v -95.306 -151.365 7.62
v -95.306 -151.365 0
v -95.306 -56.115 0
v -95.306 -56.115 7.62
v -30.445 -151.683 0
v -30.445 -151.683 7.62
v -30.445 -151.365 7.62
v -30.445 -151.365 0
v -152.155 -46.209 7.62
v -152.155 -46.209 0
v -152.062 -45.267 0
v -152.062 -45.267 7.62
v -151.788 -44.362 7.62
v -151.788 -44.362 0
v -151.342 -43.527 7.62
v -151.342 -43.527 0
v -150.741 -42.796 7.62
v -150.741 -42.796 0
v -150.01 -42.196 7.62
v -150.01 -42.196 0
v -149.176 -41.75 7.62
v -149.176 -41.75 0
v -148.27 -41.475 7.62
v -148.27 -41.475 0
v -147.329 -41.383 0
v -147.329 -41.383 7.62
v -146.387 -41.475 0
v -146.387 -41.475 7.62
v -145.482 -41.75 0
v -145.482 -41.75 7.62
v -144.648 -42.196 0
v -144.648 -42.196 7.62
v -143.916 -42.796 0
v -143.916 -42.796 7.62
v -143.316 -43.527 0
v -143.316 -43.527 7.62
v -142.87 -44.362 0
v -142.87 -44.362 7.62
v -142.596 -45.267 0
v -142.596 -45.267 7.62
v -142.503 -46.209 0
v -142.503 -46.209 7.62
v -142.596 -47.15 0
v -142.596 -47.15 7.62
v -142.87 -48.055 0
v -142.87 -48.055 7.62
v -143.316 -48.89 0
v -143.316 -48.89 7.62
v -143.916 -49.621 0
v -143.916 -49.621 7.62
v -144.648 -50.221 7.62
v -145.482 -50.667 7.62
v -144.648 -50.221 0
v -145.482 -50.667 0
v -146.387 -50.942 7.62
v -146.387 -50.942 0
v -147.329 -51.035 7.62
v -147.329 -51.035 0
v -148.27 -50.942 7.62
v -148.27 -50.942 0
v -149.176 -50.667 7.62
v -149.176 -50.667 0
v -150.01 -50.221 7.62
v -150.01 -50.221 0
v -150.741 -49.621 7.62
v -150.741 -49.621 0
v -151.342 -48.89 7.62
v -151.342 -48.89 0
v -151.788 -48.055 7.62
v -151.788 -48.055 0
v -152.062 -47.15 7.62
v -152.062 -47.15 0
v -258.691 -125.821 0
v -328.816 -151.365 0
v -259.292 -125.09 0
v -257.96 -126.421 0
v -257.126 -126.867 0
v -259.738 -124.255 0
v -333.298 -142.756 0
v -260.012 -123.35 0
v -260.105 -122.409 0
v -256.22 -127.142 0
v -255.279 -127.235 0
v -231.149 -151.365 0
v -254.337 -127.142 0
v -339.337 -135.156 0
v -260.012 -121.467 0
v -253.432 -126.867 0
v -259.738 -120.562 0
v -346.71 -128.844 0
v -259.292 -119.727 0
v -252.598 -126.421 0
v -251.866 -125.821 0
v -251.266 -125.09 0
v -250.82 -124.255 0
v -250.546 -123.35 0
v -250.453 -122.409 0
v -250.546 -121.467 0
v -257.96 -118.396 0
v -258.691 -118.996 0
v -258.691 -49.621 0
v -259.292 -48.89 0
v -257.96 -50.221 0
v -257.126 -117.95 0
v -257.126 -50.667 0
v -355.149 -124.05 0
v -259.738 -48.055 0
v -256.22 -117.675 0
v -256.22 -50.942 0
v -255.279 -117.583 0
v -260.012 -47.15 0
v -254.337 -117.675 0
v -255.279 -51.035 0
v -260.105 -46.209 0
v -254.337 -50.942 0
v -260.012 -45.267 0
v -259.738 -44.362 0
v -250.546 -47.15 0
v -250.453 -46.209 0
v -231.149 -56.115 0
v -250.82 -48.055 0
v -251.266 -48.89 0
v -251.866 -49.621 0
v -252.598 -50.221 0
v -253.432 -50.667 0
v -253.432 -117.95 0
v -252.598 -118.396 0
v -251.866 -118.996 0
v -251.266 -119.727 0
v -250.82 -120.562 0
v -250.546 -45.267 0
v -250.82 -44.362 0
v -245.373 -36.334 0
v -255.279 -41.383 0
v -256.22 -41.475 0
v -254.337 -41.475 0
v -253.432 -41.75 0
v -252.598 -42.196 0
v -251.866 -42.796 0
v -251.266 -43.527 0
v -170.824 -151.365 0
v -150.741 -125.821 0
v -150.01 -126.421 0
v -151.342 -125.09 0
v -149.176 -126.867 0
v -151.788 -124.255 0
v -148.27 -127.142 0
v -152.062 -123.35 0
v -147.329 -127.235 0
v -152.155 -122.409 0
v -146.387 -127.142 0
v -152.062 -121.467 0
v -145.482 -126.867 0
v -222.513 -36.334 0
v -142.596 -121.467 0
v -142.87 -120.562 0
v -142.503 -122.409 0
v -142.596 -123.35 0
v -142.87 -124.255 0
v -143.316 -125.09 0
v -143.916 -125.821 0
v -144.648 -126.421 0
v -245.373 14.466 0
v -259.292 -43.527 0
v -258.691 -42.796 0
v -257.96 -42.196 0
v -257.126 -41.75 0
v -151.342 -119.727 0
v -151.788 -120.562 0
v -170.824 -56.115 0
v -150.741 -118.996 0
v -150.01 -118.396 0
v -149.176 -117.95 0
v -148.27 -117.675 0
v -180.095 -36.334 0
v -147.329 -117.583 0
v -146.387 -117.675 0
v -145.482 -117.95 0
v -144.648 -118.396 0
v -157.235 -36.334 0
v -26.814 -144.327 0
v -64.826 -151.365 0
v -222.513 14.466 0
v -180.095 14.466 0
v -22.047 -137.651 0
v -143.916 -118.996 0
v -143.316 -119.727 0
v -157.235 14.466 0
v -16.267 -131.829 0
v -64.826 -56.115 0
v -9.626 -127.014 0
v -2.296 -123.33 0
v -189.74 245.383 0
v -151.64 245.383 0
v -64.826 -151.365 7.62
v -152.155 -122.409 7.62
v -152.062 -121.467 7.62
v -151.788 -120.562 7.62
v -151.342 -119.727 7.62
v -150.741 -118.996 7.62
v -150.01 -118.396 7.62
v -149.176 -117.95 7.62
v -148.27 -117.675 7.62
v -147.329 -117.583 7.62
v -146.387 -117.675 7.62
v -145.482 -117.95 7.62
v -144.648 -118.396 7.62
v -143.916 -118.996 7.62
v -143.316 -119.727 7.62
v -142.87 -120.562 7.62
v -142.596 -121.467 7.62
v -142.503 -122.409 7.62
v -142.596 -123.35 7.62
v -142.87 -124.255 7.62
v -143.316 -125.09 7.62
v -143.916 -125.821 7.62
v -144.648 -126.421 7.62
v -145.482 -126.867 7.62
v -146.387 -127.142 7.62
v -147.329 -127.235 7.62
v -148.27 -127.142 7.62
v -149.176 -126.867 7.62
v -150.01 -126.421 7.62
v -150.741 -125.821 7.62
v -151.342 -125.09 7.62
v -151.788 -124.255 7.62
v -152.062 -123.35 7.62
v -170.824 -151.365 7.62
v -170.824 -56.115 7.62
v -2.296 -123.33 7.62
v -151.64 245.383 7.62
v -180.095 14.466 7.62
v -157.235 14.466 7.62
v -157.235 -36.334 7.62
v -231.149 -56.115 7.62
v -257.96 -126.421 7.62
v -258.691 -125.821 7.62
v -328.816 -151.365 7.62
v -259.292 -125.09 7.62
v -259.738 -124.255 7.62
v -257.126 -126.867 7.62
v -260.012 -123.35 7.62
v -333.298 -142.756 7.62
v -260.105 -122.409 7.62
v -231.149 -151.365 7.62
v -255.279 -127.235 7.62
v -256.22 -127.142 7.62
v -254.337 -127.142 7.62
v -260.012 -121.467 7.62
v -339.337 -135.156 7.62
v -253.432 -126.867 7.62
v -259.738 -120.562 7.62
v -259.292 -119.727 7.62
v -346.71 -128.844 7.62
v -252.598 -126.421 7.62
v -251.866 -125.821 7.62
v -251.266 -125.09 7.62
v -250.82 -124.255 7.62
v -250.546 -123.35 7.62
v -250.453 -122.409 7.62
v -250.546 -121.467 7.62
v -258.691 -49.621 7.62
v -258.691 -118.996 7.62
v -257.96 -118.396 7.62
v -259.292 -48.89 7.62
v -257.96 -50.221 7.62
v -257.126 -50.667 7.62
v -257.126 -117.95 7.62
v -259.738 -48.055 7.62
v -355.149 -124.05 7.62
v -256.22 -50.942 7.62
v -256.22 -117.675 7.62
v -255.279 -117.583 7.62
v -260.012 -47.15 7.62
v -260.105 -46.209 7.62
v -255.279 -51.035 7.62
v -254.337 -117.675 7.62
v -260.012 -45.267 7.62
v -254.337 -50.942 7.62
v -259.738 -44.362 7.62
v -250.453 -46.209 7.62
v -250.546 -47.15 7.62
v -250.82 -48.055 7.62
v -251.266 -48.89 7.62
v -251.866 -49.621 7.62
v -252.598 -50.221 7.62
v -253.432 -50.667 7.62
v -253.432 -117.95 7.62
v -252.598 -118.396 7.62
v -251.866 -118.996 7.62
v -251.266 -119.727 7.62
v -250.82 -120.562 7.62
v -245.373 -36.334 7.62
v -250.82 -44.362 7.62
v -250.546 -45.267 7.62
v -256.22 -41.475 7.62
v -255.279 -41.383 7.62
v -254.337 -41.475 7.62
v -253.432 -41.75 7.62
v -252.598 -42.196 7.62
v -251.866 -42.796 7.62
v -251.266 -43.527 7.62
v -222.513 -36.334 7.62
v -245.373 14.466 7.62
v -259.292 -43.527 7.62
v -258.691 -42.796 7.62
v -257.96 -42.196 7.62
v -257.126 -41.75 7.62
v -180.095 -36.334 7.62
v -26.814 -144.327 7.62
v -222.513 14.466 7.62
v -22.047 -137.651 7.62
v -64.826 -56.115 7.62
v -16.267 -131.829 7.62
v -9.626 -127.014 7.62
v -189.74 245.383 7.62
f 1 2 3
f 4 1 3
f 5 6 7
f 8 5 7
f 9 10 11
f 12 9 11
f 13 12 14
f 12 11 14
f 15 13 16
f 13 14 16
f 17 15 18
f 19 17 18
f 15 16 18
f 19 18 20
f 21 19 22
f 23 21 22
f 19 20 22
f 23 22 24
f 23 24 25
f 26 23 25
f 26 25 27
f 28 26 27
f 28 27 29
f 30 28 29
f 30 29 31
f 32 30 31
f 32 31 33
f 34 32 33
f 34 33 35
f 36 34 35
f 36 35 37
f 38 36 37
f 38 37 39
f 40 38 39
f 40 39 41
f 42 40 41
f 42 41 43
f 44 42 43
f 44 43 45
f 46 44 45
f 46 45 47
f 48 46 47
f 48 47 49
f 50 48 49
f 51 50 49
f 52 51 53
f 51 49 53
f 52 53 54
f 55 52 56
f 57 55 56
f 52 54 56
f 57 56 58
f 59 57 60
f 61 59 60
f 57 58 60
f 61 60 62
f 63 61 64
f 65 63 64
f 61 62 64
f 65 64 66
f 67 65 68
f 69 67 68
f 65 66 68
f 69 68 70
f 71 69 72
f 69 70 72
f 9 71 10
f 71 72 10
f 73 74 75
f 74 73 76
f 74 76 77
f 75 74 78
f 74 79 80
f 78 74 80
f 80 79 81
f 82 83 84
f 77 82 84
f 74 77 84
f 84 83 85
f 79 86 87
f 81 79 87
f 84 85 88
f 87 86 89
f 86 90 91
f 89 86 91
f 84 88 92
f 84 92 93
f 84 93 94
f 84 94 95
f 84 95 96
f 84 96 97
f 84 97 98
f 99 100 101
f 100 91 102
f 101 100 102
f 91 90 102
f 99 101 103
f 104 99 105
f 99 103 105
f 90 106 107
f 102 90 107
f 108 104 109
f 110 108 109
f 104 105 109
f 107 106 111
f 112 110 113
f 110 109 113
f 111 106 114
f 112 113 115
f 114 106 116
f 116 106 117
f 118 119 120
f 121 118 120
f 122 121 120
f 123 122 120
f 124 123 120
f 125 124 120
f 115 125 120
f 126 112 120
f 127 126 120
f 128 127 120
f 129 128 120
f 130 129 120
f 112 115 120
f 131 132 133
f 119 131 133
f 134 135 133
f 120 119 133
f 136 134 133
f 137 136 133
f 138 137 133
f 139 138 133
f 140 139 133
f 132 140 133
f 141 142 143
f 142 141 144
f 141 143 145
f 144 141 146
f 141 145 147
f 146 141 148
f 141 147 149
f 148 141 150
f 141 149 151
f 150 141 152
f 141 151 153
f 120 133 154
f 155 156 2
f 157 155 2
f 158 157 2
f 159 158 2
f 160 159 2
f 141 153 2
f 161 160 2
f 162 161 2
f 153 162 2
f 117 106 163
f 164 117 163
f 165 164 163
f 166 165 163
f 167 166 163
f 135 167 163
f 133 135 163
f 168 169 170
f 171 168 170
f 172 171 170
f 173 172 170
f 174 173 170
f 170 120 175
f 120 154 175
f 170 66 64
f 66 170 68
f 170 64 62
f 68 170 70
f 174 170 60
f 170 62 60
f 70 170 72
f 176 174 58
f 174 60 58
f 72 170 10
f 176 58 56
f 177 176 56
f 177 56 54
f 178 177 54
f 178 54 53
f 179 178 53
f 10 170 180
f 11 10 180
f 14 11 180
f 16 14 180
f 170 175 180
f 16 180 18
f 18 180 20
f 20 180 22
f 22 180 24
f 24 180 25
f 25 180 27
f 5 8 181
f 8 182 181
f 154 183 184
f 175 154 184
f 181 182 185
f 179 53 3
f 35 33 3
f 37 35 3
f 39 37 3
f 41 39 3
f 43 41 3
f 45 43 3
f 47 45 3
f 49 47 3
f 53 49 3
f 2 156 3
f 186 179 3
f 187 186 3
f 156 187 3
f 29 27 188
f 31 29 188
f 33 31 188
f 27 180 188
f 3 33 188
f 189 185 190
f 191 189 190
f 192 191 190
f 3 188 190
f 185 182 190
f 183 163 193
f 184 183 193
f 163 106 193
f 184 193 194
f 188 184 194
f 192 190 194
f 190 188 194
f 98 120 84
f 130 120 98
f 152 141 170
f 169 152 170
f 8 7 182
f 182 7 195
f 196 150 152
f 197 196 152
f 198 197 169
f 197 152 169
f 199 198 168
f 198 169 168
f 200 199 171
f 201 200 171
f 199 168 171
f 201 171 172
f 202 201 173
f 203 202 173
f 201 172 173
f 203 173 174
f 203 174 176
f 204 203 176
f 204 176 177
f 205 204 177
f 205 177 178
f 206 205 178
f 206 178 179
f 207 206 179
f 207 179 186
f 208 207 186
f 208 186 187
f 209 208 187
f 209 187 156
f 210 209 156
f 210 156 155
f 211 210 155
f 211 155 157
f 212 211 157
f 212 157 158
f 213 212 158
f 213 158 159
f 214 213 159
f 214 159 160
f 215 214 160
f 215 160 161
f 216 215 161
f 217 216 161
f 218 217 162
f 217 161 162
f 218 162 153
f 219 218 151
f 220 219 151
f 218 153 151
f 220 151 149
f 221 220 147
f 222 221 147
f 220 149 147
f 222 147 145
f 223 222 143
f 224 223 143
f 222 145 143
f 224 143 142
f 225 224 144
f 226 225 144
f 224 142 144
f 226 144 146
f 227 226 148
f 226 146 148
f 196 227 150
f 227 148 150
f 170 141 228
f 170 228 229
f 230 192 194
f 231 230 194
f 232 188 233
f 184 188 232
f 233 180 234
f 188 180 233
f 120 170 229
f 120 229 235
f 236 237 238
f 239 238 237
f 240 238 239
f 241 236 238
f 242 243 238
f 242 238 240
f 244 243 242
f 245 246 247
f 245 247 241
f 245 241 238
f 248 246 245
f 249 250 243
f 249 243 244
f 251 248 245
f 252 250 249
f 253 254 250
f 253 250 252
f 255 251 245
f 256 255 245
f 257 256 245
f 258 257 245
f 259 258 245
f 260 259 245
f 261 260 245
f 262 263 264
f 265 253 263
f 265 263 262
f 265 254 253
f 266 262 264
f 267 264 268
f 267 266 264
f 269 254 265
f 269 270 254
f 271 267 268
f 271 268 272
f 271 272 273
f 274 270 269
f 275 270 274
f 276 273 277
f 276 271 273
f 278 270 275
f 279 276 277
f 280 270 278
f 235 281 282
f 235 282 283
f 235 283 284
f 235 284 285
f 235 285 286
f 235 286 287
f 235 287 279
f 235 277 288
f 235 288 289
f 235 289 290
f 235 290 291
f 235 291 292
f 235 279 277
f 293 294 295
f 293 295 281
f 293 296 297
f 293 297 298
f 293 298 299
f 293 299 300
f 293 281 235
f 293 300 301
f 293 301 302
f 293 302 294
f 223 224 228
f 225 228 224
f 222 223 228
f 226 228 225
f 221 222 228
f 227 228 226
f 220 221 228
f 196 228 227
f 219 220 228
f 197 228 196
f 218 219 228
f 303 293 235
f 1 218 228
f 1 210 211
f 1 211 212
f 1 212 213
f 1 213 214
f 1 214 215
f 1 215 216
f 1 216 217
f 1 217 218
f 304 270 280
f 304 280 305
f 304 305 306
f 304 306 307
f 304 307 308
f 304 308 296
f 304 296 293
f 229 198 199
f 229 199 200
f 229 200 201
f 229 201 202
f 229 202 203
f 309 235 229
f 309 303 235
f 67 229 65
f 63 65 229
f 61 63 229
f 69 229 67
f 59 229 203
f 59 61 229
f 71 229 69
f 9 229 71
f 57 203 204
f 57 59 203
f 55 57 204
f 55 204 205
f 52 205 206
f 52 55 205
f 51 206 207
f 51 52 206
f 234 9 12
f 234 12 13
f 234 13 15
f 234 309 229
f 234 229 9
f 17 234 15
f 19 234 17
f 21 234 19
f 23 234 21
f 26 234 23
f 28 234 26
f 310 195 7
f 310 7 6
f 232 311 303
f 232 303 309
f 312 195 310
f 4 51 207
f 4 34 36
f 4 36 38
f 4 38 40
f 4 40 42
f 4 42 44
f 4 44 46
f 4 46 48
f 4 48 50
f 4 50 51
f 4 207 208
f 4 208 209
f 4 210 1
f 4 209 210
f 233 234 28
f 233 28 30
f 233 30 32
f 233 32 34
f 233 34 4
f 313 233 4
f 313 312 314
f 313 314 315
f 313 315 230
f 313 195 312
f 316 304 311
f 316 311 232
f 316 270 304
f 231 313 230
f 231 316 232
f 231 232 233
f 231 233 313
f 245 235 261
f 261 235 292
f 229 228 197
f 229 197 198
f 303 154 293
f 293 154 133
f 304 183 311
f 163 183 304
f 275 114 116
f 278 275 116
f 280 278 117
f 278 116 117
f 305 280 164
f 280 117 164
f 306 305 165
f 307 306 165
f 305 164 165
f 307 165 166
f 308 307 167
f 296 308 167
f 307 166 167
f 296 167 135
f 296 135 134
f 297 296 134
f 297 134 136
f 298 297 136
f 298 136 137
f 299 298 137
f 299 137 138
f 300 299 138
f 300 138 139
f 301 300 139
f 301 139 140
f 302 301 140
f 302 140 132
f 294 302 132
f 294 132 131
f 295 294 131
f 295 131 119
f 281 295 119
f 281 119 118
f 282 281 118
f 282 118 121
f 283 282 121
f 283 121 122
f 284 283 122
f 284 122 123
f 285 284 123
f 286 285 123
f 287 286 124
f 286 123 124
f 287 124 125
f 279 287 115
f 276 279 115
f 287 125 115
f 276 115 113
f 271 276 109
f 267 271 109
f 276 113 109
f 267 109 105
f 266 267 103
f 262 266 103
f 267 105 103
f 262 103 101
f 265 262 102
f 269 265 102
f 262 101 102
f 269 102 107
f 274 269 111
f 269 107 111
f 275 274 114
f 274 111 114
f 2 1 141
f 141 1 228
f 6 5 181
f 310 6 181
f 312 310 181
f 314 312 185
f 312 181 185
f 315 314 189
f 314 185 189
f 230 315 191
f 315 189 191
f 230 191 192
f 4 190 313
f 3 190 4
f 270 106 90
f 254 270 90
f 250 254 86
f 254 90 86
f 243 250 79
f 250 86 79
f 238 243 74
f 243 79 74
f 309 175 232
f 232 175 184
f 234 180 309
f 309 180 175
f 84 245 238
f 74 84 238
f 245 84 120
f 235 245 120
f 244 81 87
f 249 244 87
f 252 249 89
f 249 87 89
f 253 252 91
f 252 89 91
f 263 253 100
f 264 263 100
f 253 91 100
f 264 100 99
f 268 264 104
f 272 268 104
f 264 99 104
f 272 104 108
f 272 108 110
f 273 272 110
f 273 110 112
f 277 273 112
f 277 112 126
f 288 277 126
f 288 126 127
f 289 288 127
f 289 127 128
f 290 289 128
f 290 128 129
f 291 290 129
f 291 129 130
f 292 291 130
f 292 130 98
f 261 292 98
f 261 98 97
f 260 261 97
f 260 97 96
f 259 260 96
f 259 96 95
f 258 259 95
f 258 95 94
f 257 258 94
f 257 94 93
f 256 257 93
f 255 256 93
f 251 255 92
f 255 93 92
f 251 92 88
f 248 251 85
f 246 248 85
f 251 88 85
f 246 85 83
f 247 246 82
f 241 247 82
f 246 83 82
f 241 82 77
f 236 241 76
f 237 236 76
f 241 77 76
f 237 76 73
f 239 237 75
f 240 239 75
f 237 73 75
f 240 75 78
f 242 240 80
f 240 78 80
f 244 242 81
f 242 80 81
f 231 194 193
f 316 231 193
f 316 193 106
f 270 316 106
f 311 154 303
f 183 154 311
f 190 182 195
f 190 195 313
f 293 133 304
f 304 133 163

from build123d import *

# Parameters (mm, degrees)
BOSS_EXTRUDE1_DEPTH     = 7.62
SKETCH5_R               = 15.875
CUT_EXTRUDE2_DEPTH      = 50.8
SKETCH6_R               = 15.875
CUT_EXTRUDE3_DEPTH      = 50.8
CUT_EXTRUDE4_DEPTH      = 1
CUT_EXTRUDE4_DEPTH_BACK = 7.62
CUT_EXTRUDE6_REACH      = 9.62
SKETCH9_R               = 4.826
SKETCH10_W              = 30.48
SKETCH10_H              = 114.3
CUT_EXTRUDE12_DEPTH     = 25.4
CUT_EXTRUDE14_REACH     = 9.62
SKETCH14_R              = 50.8
CUT_EXTRUDE15_REACH     = 9.62
SKETCH15_R              = 50.8
CUT_EXTRUDE17_START     = -7.62
SKETCH18_W              = 300.609514784
SKETCH18_H              = 19.05
CUT_EXTRUDE17_DEPTH     = 7.62
CUT_EXTRUDE18_REACH     = 9.62
SKETCH19_R              = 4.826
CUT_EXTRUDE19_REACH     = 9.62
SKETCH20_W              = 22.86
SKETCH20_H              = 50.8
CUT_EXTRUDE20_REACH     = 9.62
SKETCH21_W              = 12.7
SKETCH21_H              = 95.25


with BuildPart() as part:
    # Sketch2 → Boss-Extrude1 (new body)
    with BuildSketch(Plane.XY):
        Polygon((-189.740054039, 245.383385713), (-375.90852523, -170.414614287), (16.77547477, -170.414614287), (-151.640054039, 245.383385713), align=None)
    extrude(amount=BOSS_EXTRUDE1_DEPTH)

    # Sketch5 → Cut-Extrude2 (cut)
    with BuildSketch(Plane(origin=(0, 0, 0), x_dir=(-1, 0, 0), z_dir=(0, 0, -1))):
        with Locations((375.90852523, -170.414614287)):
            Circle(SKETCH5_R)
    extrude(amount=-CUT_EXTRUDE2_DEPTH, mode=Mode.SUBTRACT)

    # Sketch6 → Cut-Extrude3 (cut)
    with BuildSketch(Plane(origin=(0, 0, 0), x_dir=(-1, 0, 0), z_dir=(0, 0, -1))):
        with Locations((-16.77547477, -170.414614287)):
            Circle(SKETCH6_R)
    extrude(amount=-CUT_EXTRUDE3_DEPTH, mode=Mode.SUBTRACT)

    # Sketch8 → Cut-Extrude4 (cut, two sides)
    with BuildSketch(Plane(origin=(0, 0, 0), x_dir=(-1, 0, 0), z_dir=(0, 0, -1))) as cut_extrude4_sk:
        Polygon((218.448947474, -1130.046710402), (218.448947474, -170.414614287), (218.448947474, -56.114614287), (183.523947474, -56.114614287), (183.523947474, -170.414614287), (183.523947474, -1130.046710402), (183.523947474, -3049.310902633), (218.448947474, -3049.310902633), align=None)
    extrude(amount=CUT_EXTRUDE4_DEPTH, mode=Mode.SUBTRACT)
    extrude(cut_extrude4_sk.sketch, amount=-CUT_EXTRUDE4_DEPTH_BACK, mode=Mode.SUBTRACT)

    # Sketch9 → Cut-Extrude6 (cut, up to next)
    with BuildSketch(Plane(origin=(0, 0, 0), x_dir=(-1, 0, 0), z_dir=(0, 0, -1)), mode=Mode.PRIVATE) as cut_extrude6_sk1:
        with Locations((147.328947474, -122.408614287)):
            Circle(SKETCH9_R)
    cut_extrude6_tool1 = extrude(cut_extrude6_sk1.sketch, amount=-CUT_EXTRUDE6_REACH, mode=Mode.PRIVATE) & part.part
    add(cut_extrude6_tool1.solids().sort_by_distance((-147.328947, -122.408614, 0))[0], mode=Mode.SUBTRACT)
    # Sketch9 → Cut-Extrude6 (cut, up to next)
    with BuildSketch(Plane(origin=(0, 0, 0), x_dir=(-1, 0, 0), z_dir=(0, 0, -1)), mode=Mode.PRIVATE) as cut_extrude6_sk2:
        with Locations((255.278947474, -122.408614287)):
            Circle(SKETCH9_R)
    cut_extrude6_tool2 = extrude(cut_extrude6_sk2.sketch, amount=-CUT_EXTRUDE6_REACH, mode=Mode.PRIVATE) & part.part
    add(cut_extrude6_tool2.solids().sort_by_distance((-255.278947, -122.408614, 0))[0], mode=Mode.SUBTRACT)

    # Sketch10 → Cut-Extrude12 (cut)
    with BuildSketch(Plane(origin=(0, 0, 0), x_dir=(-1, 0, 0), z_dir=(0, 0, -1))):
        with Locations((80.066257047, -113.264614287)):
            Rectangle(SKETCH10_W, SKETCH10_H)
    extrude(amount=-CUT_EXTRUDE12_DEPTH, mode=Mode.SUBTRACT)

    # Sketch14 → Cut-Extrude14 (cut, up to next)
    with BuildSketch(Plane(origin=(0, 0, 0), x_dir=(-1, 0, 0), z_dir=(0, 0, -1)), mode=Mode.PRIVATE) as cut_extrude14_sk1:
        with Locations((-16.77547477, -170.414614287)):
            Circle(SKETCH14_R)
    cut_extrude14_tool1 = extrude(cut_extrude14_sk1.sketch, amount=-CUT_EXTRUDE14_REACH, mode=Mode.PRIVATE) & part.part
    add(cut_extrude14_tool1.solids().sort_by_distance((16.775475, -170.414614, 0))[0], mode=Mode.SUBTRACT)

    # Sketch15 → Cut-Extrude15 (cut, up to next)
    with BuildSketch(Plane(origin=(0, 0, 0), x_dir=(-1, 0, 0), z_dir=(0, 0, -1)), mode=Mode.PRIVATE) as cut_extrude15_sk1:
        with Locations((375.90852523, -170.414614287)):
            Circle(SKETCH15_R)
    cut_extrude15_tool1 = extrude(cut_extrude15_sk1.sketch, amount=-CUT_EXTRUDE15_REACH, mode=Mode.PRIVATE) & part.part
    add(cut_extrude15_tool1.solids().sort_by_distance((-375.908525, -170.414614, 0))[0], mode=Mode.SUBTRACT)

    # Sketch18 → Cut-Extrude17 (cut)
    with BuildSketch(Plane(origin=(0, 0, 0), x_dir=(-1, 0, 0), z_dir=(0, 0, -1)).offset(CUT_EXTRUDE17_START)):
        with Locations((180.749872138, -160.889614287)):
            Rectangle(SKETCH18_W, SKETCH18_H)
    extrude(amount=CUT_EXTRUDE17_DEPTH, mode=Mode.SUBTRACT)

    # Sketch19 → Cut-Extrude18 (cut, up to next)
    with BuildSketch(Plane(origin=(0, 0, 0), x_dir=(-1, 0, 0), z_dir=(0, 0, -1)), mode=Mode.PRIVATE) as cut_extrude18_sk1:
        with Locations((255.278947474, -46.208614287)):
            Circle(SKETCH19_R)
    cut_extrude18_tool1 = extrude(cut_extrude18_sk1.sketch, amount=-CUT_EXTRUDE18_REACH, mode=Mode.PRIVATE) & part.part
    add(cut_extrude18_tool1.solids().sort_by_distance((-255.278947, -46.208614, 0))[0], mode=Mode.SUBTRACT)
    # Sketch19 → Cut-Extrude18 (cut, up to next)
    with BuildSketch(Plane(origin=(0, 0, 0), x_dir=(-1, 0, 0), z_dir=(0, 0, -1)), mode=Mode.PRIVATE) as cut_extrude18_sk2:
        with Locations((147.328947474, -46.208614287)):
            Circle(SKETCH19_R)
    cut_extrude18_tool2 = extrude(cut_extrude18_sk2.sketch, amount=-CUT_EXTRUDE18_REACH, mode=Mode.PRIVATE) & part.part
    add(cut_extrude18_tool2.solids().sort_by_distance((-147.328947, -46.208614, 0))[0], mode=Mode.SUBTRACT)

    # Sketch20 → Cut-Extrude19 (cut, up to next)
    with BuildSketch(Plane(origin=(0, 0, 0), x_dir=(-1, 0, 0), z_dir=(0, 0, -1)), mode=Mode.PRIVATE) as cut_extrude19_sk1:
        with Locations((168.664947474, -10.934247938)):
            Rectangle(SKETCH20_W, SKETCH20_H)
    cut_extrude19_tool1 = extrude(cut_extrude19_sk1.sketch, amount=-CUT_EXTRUDE19_REACH, mode=Mode.PRIVATE) & part.part
    add(cut_extrude19_tool1.solids().sort_by_distance((-168.664947, -10.934248, 0))[0], mode=Mode.SUBTRACT)
    # Sketch20 → Cut-Extrude19 (cut, up to next)
    with BuildSketch(Plane(origin=(0, 0, 0), x_dir=(-1, 0, 0), z_dir=(0, 0, -1)), mode=Mode.PRIVATE) as cut_extrude19_sk2:
        with Locations((233.942947474, -10.934247938)):
            Rectangle(SKETCH20_W, SKETCH20_H)
    cut_extrude19_tool2 = extrude(cut_extrude19_sk2.sketch, amount=-CUT_EXTRUDE19_REACH, mode=Mode.PRIVATE) & part.part
    add(cut_extrude19_tool2.solids().sort_by_distance((-233.942947, -10.934248, 0))[0], mode=Mode.SUBTRACT)

    # Sketch21 → Cut-Extrude20 (cut, up to next)
    with BuildSketch(Plane(origin=(0, 0, 0), x_dir=(-1, 0, 0), z_dir=(0, 0, -1)), mode=Mode.PRIVATE) as cut_extrude20_sk1:
        with Locations((224.798947474, -103.739614287)):
            Rectangle(SKETCH21_W, SKETCH21_H)
    cut_extrude20_tool1 = extrude(cut_extrude20_sk1.sketch, amount=-CUT_EXTRUDE20_REACH, mode=Mode.PRIVATE) & part.part
    add(cut_extrude20_tool1.solids().sort_by_distance((-224.798947, -103.739614, 0))[0], mode=Mode.SUBTRACT)
    # Sketch21 → Cut-Extrude20 (cut, up to next)
    with BuildSketch(Plane(origin=(0, 0, 0), x_dir=(-1, 0, 0), z_dir=(0, 0, -1)), mode=Mode.PRIVATE) as cut_extrude20_sk2:
        with Locations((177.173947474, -103.739614287)):
            Rectangle(SKETCH21_W, SKETCH21_H)
    cut_extrude20_tool2 = extrude(cut_extrude20_sk2.sketch, amount=-CUT_EXTRUDE20_REACH, mode=Mode.PRIVATE) & part.part
    add(cut_extrude20_tool2.solids().sort_by_distance((-177.173947, -103.739614, 0))[0], mode=Mode.SUBTRACT)


solid = part.part
